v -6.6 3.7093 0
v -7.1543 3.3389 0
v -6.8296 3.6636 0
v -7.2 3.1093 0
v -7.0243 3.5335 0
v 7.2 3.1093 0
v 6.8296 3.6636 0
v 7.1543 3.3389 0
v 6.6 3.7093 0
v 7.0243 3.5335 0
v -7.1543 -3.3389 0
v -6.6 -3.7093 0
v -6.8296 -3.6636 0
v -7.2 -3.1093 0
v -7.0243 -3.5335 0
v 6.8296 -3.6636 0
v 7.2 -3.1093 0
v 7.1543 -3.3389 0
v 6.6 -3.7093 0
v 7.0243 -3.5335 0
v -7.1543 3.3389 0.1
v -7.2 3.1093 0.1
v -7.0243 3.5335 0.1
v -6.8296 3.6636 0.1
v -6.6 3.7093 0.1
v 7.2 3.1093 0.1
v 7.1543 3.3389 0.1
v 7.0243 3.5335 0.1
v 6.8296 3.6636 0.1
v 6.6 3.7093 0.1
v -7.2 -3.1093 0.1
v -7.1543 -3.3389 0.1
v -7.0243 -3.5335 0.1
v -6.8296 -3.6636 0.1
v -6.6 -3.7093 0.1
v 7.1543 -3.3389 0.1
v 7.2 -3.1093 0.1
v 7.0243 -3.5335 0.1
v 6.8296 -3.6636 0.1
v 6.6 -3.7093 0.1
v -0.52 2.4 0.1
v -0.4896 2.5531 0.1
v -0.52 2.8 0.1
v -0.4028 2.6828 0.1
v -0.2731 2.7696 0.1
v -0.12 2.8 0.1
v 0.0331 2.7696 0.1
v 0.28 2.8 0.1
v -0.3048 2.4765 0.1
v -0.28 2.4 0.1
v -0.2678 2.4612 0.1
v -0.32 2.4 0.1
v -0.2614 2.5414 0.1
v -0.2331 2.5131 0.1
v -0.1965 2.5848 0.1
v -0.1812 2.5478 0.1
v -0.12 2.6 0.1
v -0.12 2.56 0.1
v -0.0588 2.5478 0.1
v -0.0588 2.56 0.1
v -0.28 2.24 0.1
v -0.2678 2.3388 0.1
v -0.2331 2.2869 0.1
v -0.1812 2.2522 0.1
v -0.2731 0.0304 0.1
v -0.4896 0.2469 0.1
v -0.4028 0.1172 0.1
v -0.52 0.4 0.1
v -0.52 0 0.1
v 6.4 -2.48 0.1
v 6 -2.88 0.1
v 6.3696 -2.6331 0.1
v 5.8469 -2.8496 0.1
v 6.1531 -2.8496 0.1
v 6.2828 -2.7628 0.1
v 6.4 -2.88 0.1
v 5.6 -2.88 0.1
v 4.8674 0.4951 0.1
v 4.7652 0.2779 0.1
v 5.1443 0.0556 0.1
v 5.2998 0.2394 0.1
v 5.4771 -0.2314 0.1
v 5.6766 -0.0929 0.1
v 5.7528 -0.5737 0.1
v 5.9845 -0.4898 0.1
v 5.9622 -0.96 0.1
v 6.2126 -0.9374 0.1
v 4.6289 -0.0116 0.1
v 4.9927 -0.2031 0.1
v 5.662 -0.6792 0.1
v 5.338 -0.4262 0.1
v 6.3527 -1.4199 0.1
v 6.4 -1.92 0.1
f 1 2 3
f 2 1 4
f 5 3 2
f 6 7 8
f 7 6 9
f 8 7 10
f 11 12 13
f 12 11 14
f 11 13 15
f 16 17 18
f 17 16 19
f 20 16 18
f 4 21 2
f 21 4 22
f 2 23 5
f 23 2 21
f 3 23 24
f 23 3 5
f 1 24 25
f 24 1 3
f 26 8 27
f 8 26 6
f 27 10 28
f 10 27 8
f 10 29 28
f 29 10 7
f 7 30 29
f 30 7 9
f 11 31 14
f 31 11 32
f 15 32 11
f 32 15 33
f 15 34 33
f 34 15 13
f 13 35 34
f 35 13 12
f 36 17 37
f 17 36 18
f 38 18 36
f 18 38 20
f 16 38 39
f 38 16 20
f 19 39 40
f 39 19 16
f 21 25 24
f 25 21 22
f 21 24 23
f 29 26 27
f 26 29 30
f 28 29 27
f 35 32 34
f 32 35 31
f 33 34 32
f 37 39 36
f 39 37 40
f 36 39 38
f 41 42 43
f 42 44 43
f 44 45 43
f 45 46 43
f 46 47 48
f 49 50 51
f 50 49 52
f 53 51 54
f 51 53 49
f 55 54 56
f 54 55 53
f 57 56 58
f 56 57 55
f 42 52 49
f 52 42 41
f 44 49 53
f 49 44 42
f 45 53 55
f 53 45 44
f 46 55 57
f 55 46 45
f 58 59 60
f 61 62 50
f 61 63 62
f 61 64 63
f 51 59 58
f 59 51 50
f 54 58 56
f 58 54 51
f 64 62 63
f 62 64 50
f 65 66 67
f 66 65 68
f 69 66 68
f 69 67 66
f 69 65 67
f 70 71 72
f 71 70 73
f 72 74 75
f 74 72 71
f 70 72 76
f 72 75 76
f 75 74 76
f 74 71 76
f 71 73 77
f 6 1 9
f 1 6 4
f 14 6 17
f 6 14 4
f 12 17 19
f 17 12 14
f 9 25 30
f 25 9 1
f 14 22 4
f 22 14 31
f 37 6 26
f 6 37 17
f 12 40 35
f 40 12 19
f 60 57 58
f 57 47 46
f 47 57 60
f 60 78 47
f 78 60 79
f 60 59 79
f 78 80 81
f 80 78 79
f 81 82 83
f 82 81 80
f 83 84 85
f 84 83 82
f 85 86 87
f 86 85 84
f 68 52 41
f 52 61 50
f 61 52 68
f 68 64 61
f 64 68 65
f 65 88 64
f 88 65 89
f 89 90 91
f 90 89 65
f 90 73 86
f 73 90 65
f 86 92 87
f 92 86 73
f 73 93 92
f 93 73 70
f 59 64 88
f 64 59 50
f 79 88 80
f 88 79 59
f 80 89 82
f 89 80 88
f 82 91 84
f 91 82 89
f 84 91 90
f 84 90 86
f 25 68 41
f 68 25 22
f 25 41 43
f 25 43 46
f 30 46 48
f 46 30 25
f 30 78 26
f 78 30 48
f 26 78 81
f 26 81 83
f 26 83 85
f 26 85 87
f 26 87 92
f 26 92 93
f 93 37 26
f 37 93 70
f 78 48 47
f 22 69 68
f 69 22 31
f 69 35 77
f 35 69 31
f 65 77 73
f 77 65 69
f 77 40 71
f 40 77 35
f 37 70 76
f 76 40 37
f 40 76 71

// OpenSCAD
use <../lib.scad>
use <../p/1-16chrd.scad>
use <../p/1-16tndis.scad>
use <../p/1-4chrd.scad>
use <../p/1-4cyli.scad>
use <../p/1-4ring1.scad>
use <../p/1-4ring4.scad>
use <../p/3-16chrd.scad>
use <../p/3-16ndis.scad>
use <../p/5-16chrd.scad>
use <../p/5-16ndis.scad>
$fa=1; $fs=0.2;
function ldraw_lib__6141875j(realsolid=false) = [
// 0 Sticker  0.9 x  1.8 with Black Air Vent on Blue Background Right
// 0 Name: 6141875j.dat
// 0 Author: Massimo Maso [Sirio]
// 0 !LDRAW_ORG Part UPDATE 2022-06
// 0 !LICENSE Licensed under CC BY 2.0 and CC BY 4.0 : see CAreadme.txt
// 
// 0 BFC CERTIFY CCW
  [0,"BFC","CERTIFY"],
  [0,"BFC","CCW"],
// 
// 0 !KEYWORDS Bricklink 75875stk01, Brickowl 53567, F-150, Ford, Raptor
// 0 !KEYWORDS Rebrickable 24760, Set 75875, Speed Champions
// 
// 0 !HISTORY 2022-12-20 [PTadmin] Official Update 2022-06
// 
// 
// 0 // Primitives
// 
// 1 16 -16.5 0 7.7732 -1.5 0 0 0 -1 0 0 0 1.5 1-4chrd.dat
  [1,16,-16.5,0,7.7732,-1.5,0,0,0,-1,0,0,0,1.5, ldraw_lib__1_4chrd(realsolid)],
// 1 16 16.5 0 7.7732 1.5 0 0 0 -1 0 0 0 1.5 1-4chrd.dat
  [1,16,16.5,0,7.7732,1.5,0,0,0,-1,0,0,0,1.5, ldraw_lib__1_4chrd(realsolid)],
// 1 16 -16.5 0 -7.7732 -1.5 0 0 0 -1 0 0 0 -1.5 1-4chrd.dat
  [1,16,-16.5,0,-7.7732,-1.5,0,0,0,-1,0,0,0,-1.5, ldraw_lib__1_4chrd(realsolid)],
// 1 16 16.5 0 -7.7732 1.5 0 0 0 -1 0 0 0 -1.5 1-4chrd.dat
  [1,16,16.5,0,-7.7732,1.5,0,0,0,-1,0,0,0,-1.5, ldraw_lib__1_4chrd(realsolid)],
// 1 16 -16.5 0 7.7732 -1.5 0 0 0 -.25 0 0 0 1.5 1-4cyli.dat
  [1,16,-16.5,0,7.7732,-1.5,0,0,0,-.25,0,0,0,1.5, ldraw_lib__1_4cyli(realsolid)],
// 1 16 16.5 0 7.7732 1.5 0 0 0 -.25 0 0 0 1.5 1-4cyli.dat
  [1,16,16.5,0,7.7732,1.5,0,0,0,-.25,0,0,0,1.5, ldraw_lib__1_4cyli(realsolid)],
// 1 16 -16.5 0 -7.7732 -1.5 0 0 0 -.25 0 0 0 -1.5 1-4cyli.dat
  [1,16,-16.5,0,-7.7732,-1.5,0,0,0,-.25,0,0,0,-1.5, ldraw_lib__1_4cyli(realsolid)],
// 1 16 16.5 0 -7.7732 1.5 0 0 0 -.25 0 0 0 -1.5 1-4cyli.dat
  [1,16,16.5,0,-7.7732,1.5,0,0,0,-.25,0,0,0,-1.5, ldraw_lib__1_4cyli(realsolid)],
// 1 1 -16.5 -.25 7.7732 -1.5 0 0 0 1 0 0 0 1.5 1-4chrd.dat
  [1,1,-16.5,-.25,7.7732,-1.5,0,0,0,1,0,0,0,1.5, ldraw_lib__1_4chrd(realsolid)],
// 1 1 16.5 -.25 7.7732 1.5 0 0 0 1 0 0 0 1.5 1-4chrd.dat
  [1,1,16.5,-.25,7.7732,1.5,0,0,0,1,0,0,0,1.5, ldraw_lib__1_4chrd(realsolid)],
// 1 1 -16.5 -.25 -7.7732 -1.5 0 0 0 1 0 0 0 -1.5 1-4chrd.dat
  [1,1,-16.5,-.25,-7.7732,-1.5,0,0,0,1,0,0,0,-1.5, ldraw_lib__1_4chrd(realsolid)],
// 1 1 16.5 -.25 -7.7732 1.5 0 0 0 1 0 0 0 -1.5 1-4chrd.dat
  [1,1,16.5,-.25,-7.7732,1.5,0,0,0,1,0,0,0,-1.5, ldraw_lib__1_4chrd(realsolid)],
// 1 1 -.3 -.25 6 -1 0 0 0 1 0 0 0 1 5-16ndis.dat
  [1,1,-.3,-.25,6,-1,0,0,0,1,0,0,0,1, ldraw_lib__5_16ndis(realsolid)],
// 1 0 -.3 -.25 6 -.1 0 0 0 1 0 0 0 .1 1-4ring4.dat
  [1,0,-.3,-.25,6,-.1,0,0,0,1,0,0,0,.1, ldraw_lib__1_4ring4(realsolid)],
// 1 0 -.3 -.25 6 -.5 0 0 0 1 0 0 0 .5 1-4ring1.dat
  [1,0,-.3,-.25,6,-.5,0,0,0,1,0,0,0,.5, ldraw_lib__1_4ring1(realsolid)],
// 1 0 -.3 -.25 6 0 0 1 0 1 0 1 0 0 1-16chrd.dat
  [1,0,-.3,-.25,6,0,0,1,0,1,0,1,0,0, ldraw_lib__1_16chrd(realsolid)],
// 1 0 -.3 -.25 6 0 0 .4 0 1 0 .4 0 0 1-16tndis.dat
  [1,0,-.3,-.25,6,0,0,.4,0,1,0,.4,0,0, ldraw_lib__1_16tndis(realsolid)],
// 1 0 -.3 -.25 6 -.4 0 0 0 1 0 0 0 -.4 3-16ndis.dat
  [1,0,-.3,-.25,6,-.4,0,0,0,1,0,0,0,-.4, ldraw_lib__3_16ndis(realsolid)],
// 1 1 -.3 -.25 6 -.4 0 0 0 1 0 0 0 .4 5-16chrd.dat
  [1,1,-.3,-.25,6,-.4,0,0,0,1,0,0,0,.4, ldraw_lib__5_16chrd(realsolid)],
// 1 1 -.3 -.25 6 -.4 0 0 0 1 0 0 0 -.4 3-16chrd.dat
  [1,1,-.3,-.25,6,-.4,0,0,0,1,0,0,0,-.4, ldraw_lib__3_16chrd(realsolid)],
// 1 0 -.3 -.25 1 -1 0 0 0 1 0 0 0 -1 3-16chrd.dat
  [1,0,-.3,-.25,1,-1,0,0,0,1,0,0,0,-1, ldraw_lib__3_16chrd(realsolid)],
// 1 1 -.3 -.25 1 -1 0 0 0 1 0 0 0 -1 3-16ndis.dat
  [1,1,-.3,-.25,1,-1,0,0,0,1,0,0,0,-1, ldraw_lib__3_16ndis(realsolid)],
// 1 0 15 -.25 -6.2 1 0 0 0 1 0 0 0 -1 5-16chrd.dat
  [1,0,15,-.25,-6.2,1,0,0,0,1,0,0,0,-1, ldraw_lib__5_16chrd(realsolid)],
// 1 1 15 -.25 -6.2 1 0 0 0 1 0 0 0 -1 5-16ndis.dat
  [1,1,15,-.25,-6.2,1,0,0,0,1,0,0,0,-1, ldraw_lib__5_16ndis(realsolid)],
// 0 // Bottom face
// 4 16 16.5 0 9.2732 18 0 7.7732 -18 0 7.7732 -16.5 0 9.2732
  [4,16,16.5,0,9.2732,18,0,7.7732,-18,0,7.7732,-16.5,0,9.2732],
// 4 16 18 0 7.7732 18 0 -7.7732 -18 0 -7.7732 -18 0 7.7732
  [4,16,18,0,7.7732,18,0,-7.7732,-18,0,-7.7732,-18,0,7.7732],
// 4 16 16.5 0 -9.2732 -16.5 0 -9.2732 -18 0 -7.7732 18 0 -7.7732
  [4,16,16.5,0,-9.2732,-16.5,0,-9.2732,-18,0,-7.7732,18,0,-7.7732],
// 0 // Lateral face
// 4 16 -16.5 0 9.2732 -16.5 -.25 9.2732 16.5 -.25 9.2732 16.5 0 9.2732
  [4,16,-16.5,0,9.2732,-16.5,-.25,9.2732,16.5,-.25,9.2732,16.5,0,9.2732],
// 4 16 -18 0 7.7732 -18 0 -7.7732 -18 -.25 -7.7732 -18 -.25 7.7732
  [4,16,-18,0,7.7732,-18,0,-7.7732,-18,-.25,-7.7732,-18,-.25,7.7732],
// 4 16 18 0 7.7732 18 -.25 7.7732 18 -.25 -7.7732 18 0 -7.7732
  [4,16,18,0,7.7732,18,-.25,7.7732,18,-.25,-7.7732,18,0,-7.7732],
// 4 16 -16.5 0 -9.2732 16.5 0 -9.2732 16.5 -.25 -9.2732 -16.5 -.25 -9.2732
  [4,16,-16.5,0,-9.2732,16.5,0,-9.2732,16.5,-.25,-9.2732,-16.5,-.25,-9.2732],
// 0 // Top face
// 0 // Black faces
// 3 0 -.14692 -.25 6.4 -.3 -.25 6.5 -.3 -.25 6.4
  [3,0,-.14692,-.25,6.4,-.3,-.25,6.5,-.3,-.25,6.4],
// 4 0 -.14692 -.25 6.4 .0827 -.25 6.9239 -.3 -.25 7 -.3 -.25 6.5
  [4,0,-.14692,-.25,6.4,.0827,-.25,6.9239,-.3,-.25,7,-.3,-.25,6.5],
// 4 0 -.14692 -.25 6.4 11.913 -.25 .6948 12.1684 -.25 1.2377 .0827 -.25 6.9239
  [4,0,-.14692,-.25,6.4,11.913,-.25,.6948,12.1684,-.25,1.2377,.0827,-.25,6.9239],
// 3 0 -.14692 -.25 6.4 -.14692 -.25 6.36956 11.913 -.25 .6948
  [3,0,-.14692,-.25,6.4,-.14692,-.25,6.36956,11.913,-.25,.6948],
// 4 0 12.8607 -.25 .139 13.2495 -.25 .5984 12.1684 -.25 1.2377 11.913 -.25 .6948
  [4,0,12.8607,-.25,.139,13.2495,-.25,.5984,12.1684,-.25,1.2377,11.913,-.25,.6948],
// 4 0 12.8607 -.25 .139 13.6927 -.25 -.5785 14.1915 -.25 -.2322 13.2495 -.25 .5984
  [4,0,12.8607,-.25,.139,13.6927,-.25,-.5785,14.1915,-.25,-.2322,13.2495,-.25,.5984],
// 4 0 14.3819 -.25 -1.4342 14.9613 -.25 -1.2246 14.1915 -.25 -.2322 13.6927 -.25 -.5785
  [4,0,14.3819,-.25,-1.4342,14.9613,-.25,-1.2246,14.1915,-.25,-.2322,13.6927,-.25,-.5785],
// 4 0 14.3819 -.25 -1.4342 14.9056 -.25 -2.4 15.5314 -.25 -2.3436 14.9613 -.25 -1.2246
  [4,0,14.3819,-.25,-1.4342,14.9056,-.25,-2.4,15.5314,-.25,-2.3436,14.9613,-.25,-1.2246],
// 3 0 -1.3 -.25 1 -.8 -.25 6 -1.3 -.25 6
  [3,0,-1.3,-.25,1,-.8,-.25,6,-1.3,-.25,6],
// 4 0 -1.3 -.25 1 -.7 -.25 5.6 -.7 -.25 6 -.8 -.25 6
  [4,0,-1.3,-.25,1,-.7,-.25,5.6,-.7,-.25,6,-.8,-.25,6],
// 4 0 -1.3 -.25 1 -.6827 -.25 .0761 -.45308 -.25 5.63044 -.7 -.25 5.6
  [4,0,-1.3,-.25,1,-.6827,-.25,.0761,-.45308,-.25,5.63044,-.7,-.25,5.6],
// 4 0 -.6827 -.25 .0761 12.4818 -.25 -.5077 11.5723 -.25 -.0291 -.45308 -.25 5.63044
  [4,0,-.6827,-.25,.0761,12.4818,-.25,-.5077,11.5723,-.25,-.0291,-.45308,-.25,5.63044],
// 4 0 -.6827 -.25 .0761 14.1551 -.25 -1.6979 13.345 -.25 -1.0655 12.4818 -.25 -.5077
  [4,0,-.6827,-.25,.0761,14.1551,-.25,-1.6979,13.345,-.25,-1.0655,12.4818,-.25,-.5077],
// 4 0 -.6827 -.25 .0761 14.6173 -.25 -7.1239 14.9056 -.25 -2.4 14.1551 -.25 -1.6979
  [4,0,-.6827,-.25,.0761,14.6173,-.25,-7.1239,14.9056,-.25,-2.4,14.1551,-.25,-1.6979],
// 4 0 14.6173 -.25 -7.1239 15.8818 -.25 -3.5497 15.5314 -.25 -2.3436 14.9056 -.25 -2.4
  [4,0,14.6173,-.25,-7.1239,15.8818,-.25,-3.5497,15.5314,-.25,-2.3436,14.9056,-.25,-2.4],
// 4 0 14.6173 -.25 -7.1239 16 -.25 -6.2 16 -.25 -4.8 15.8818 -.25 -3.5497
  [4,0,14.6173,-.25,-7.1239,16,-.25,-6.2,16,-.25,-4.8,15.8818,-.25,-3.5497],
// 0 // Inner blue faces
// 4 1 11.5723 -.25 -.0291 -.14692 -.25 6.36956 -.7 -.25 6 -.45308 -.25 5.63044
  [4,1,11.5723,-.25,-.0291,-.14692,-.25,6.36956,-.7,-.25,6,-.45308,-.25,5.63044],
// 4 1 11.5723 -.25 -.0291 12.8607 -.25 .139 11.913 -.25 .6948 -.14692 -.25 6.36956
  [4,1,11.5723,-.25,-.0291,12.8607,-.25,.139,11.913,-.25,.6948,-.14692,-.25,6.36956],
// 4 1 11.5723 -.25 -.0291 12.4818 -.25 -.5077 13.6927 -.25 -.5785 12.8607 -.25 .139
  [4,1,11.5723,-.25,-.0291,12.4818,-.25,-.5077,13.6927,-.25,-.5785,12.8607,-.25,.139],
// 4 1 14.3819 -.25 -1.4342 13.6927 -.25 -.5785 12.4818 -.25 -.5077 13.345 -.25 -1.0655
  [4,1,14.3819,-.25,-1.4342,13.6927,-.25,-.5785,12.4818,-.25,-.5077,13.345,-.25,-1.0655],
// 3 1 14.3819 -.25 -1.4342 13.345 -.25 -1.0655 14.1551 -.25 -1.6979
  [3,1,14.3819,-.25,-1.4342,13.345,-.25,-1.0655,14.1551,-.25,-1.6979],
// 3 1 14.3819 -.25 -1.4342 14.1551 -.25 -1.6979 14.9056 -.25 -2.4
  [3,1,14.3819,-.25,-1.4342,14.1551,-.25,-1.6979,14.9056,-.25,-2.4],
// 0 // Outer blue faces
// 4 1 -16.5 -.25 9.2732 -18 -.25 7.7732 -1.3 -.25 1 -1.3 -.25 6
  [4,1,-16.5,-.25,9.2732,-18,-.25,7.7732,-1.3,-.25,1,-1.3,-.25,6],
// 3 1 -16.5 -.25 9.2732 -1.3 -.25 6 -1.3 -.25 7
  [3,1,-16.5,-.25,9.2732,-1.3,-.25,6,-1.3,-.25,7],
// 3 1 -16.5 -.25 9.2732 -1.3 -.25 7 -.3 -.25 7
  [3,1,-16.5,-.25,9.2732,-1.3,-.25,7,-.3,-.25,7],
// 4 1 -16.5 -.25 9.2732 -.3 -.25 7 .7 -.25 7 16.5 -.25 9.2732
  [4,1,-16.5,-.25,9.2732,-.3,-.25,7,.7,-.25,7,16.5,-.25,9.2732],
// 4 1 18 -.25 7.7732 16.5 -.25 9.2732 .7 -.25 7 12.1684 -.25 1.2377
  [4,1,18,-.25,7.7732,16.5,-.25,9.2732,.7,-.25,7,12.1684,-.25,1.2377],
// 3 1 18 -.25 7.7732 12.1684 -.25 1.2377 13.2495 -.25 .5984
  [3,1,18,-.25,7.7732,12.1684,-.25,1.2377,13.2495,-.25,.5984],
// 3 1 18 -.25 7.7732 13.2495 -.25 .5984 14.1915 -.25 -.2322
  [3,1,18,-.25,7.7732,13.2495,-.25,.5984,14.1915,-.25,-.2322],
// 3 1 18 -.25 7.7732 14.1915 -.25 -.2322 14.9613 -.25 -1.2246
  [3,1,18,-.25,7.7732,14.1915,-.25,-.2322,14.9613,-.25,-1.2246],
// 3 1 18 -.25 7.7732 14.9613 -.25 -1.2246 15.5314 -.25 -2.3436
  [3,1,18,-.25,7.7732,14.9613,-.25,-1.2246,15.5314,-.25,-2.3436],
// 3 1 18 -.25 7.7732 15.5314 -.25 -2.3436 15.8818 -.25 -3.5497
  [3,1,18,-.25,7.7732,15.5314,-.25,-2.3436,15.8818,-.25,-3.5497],
// 3 1 18 -.25 7.7732 15.8818 -.25 -3.5497 16 -.25 -4.8
  [3,1,18,-.25,7.7732,15.8818,-.25,-3.5497,16,-.25,-4.8],
// 4 1 18 -.25 7.7732 16 -.25 -4.8 16 -.25 -6.2 18 -.25 -7.7732
  [4,1,18,-.25,7.7732,16,-.25,-4.8,16,-.25,-6.2,18,-.25,-7.7732],
// 3 1 12.1684 -.25 1.2377 .7 -.25 7 .0827 -.25 6.9239
  [3,1,12.1684,-.25,1.2377,.7,-.25,7,.0827,-.25,6.9239],
// 4 1 -18 -.25 -7.7732 -1.3 -.25 0 -1.3 -.25 1 -18 -.25 7.7732
  [4,1,-18,-.25,-7.7732,-1.3,-.25,0,-1.3,-.25,1,-18,-.25,7.7732],
// 4 1 -18 -.25 -7.7732 -16.5 -.25 -9.2732 14 -.25 -7.2 -1.3 -.25 0
  [4,1,-18,-.25,-7.7732,-16.5,-.25,-9.2732,14,-.25,-7.2,-1.3,-.25,0],
// 4 1 14 -.25 -7.2 14.6173 -.25 -7.1239 -.6827 -.25 .0761 -1.3 -.25 0
  [4,1,14,-.25,-7.2,14.6173,-.25,-7.1239,-.6827,-.25,.0761,-1.3,-.25,0],
// 4 1 14 -.25 -7.2 -16.5 -.25 -9.2732 16.5 -.25 -9.2732 15 -.25 -7.2
  [4,1,14,-.25,-7.2,-16.5,-.25,-9.2732,16.5,-.25,-9.2732,15,-.25,-7.2],
// 3 1 18 -.25 -7.7732 16 -.25 -6.2 16 -.25 -7.2
  [3,1,18,-.25,-7.7732,16,-.25,-6.2,16,-.25,-7.2],
// 4 1 18 -.25 -7.7732 16 -.25 -7.2 15 -.25 -7.2 16.5 -.25 -9.2732
  [4,1,18,-.25,-7.7732,16,-.25,-7.2,15,-.25,-7.2,16.5,-.25,-9.2732],
];
module ldraw_lib__6141875j(step=0, col=false, unit=2/5, alt=false, line=0.2, solid=!$preview)
    makepoly(ldraw_lib__6141875j(solid), step=step, col=col, unit=unit, alt=alt, line=line, solid=solid);
ldraw_lib__6141875j(line=0.2);
